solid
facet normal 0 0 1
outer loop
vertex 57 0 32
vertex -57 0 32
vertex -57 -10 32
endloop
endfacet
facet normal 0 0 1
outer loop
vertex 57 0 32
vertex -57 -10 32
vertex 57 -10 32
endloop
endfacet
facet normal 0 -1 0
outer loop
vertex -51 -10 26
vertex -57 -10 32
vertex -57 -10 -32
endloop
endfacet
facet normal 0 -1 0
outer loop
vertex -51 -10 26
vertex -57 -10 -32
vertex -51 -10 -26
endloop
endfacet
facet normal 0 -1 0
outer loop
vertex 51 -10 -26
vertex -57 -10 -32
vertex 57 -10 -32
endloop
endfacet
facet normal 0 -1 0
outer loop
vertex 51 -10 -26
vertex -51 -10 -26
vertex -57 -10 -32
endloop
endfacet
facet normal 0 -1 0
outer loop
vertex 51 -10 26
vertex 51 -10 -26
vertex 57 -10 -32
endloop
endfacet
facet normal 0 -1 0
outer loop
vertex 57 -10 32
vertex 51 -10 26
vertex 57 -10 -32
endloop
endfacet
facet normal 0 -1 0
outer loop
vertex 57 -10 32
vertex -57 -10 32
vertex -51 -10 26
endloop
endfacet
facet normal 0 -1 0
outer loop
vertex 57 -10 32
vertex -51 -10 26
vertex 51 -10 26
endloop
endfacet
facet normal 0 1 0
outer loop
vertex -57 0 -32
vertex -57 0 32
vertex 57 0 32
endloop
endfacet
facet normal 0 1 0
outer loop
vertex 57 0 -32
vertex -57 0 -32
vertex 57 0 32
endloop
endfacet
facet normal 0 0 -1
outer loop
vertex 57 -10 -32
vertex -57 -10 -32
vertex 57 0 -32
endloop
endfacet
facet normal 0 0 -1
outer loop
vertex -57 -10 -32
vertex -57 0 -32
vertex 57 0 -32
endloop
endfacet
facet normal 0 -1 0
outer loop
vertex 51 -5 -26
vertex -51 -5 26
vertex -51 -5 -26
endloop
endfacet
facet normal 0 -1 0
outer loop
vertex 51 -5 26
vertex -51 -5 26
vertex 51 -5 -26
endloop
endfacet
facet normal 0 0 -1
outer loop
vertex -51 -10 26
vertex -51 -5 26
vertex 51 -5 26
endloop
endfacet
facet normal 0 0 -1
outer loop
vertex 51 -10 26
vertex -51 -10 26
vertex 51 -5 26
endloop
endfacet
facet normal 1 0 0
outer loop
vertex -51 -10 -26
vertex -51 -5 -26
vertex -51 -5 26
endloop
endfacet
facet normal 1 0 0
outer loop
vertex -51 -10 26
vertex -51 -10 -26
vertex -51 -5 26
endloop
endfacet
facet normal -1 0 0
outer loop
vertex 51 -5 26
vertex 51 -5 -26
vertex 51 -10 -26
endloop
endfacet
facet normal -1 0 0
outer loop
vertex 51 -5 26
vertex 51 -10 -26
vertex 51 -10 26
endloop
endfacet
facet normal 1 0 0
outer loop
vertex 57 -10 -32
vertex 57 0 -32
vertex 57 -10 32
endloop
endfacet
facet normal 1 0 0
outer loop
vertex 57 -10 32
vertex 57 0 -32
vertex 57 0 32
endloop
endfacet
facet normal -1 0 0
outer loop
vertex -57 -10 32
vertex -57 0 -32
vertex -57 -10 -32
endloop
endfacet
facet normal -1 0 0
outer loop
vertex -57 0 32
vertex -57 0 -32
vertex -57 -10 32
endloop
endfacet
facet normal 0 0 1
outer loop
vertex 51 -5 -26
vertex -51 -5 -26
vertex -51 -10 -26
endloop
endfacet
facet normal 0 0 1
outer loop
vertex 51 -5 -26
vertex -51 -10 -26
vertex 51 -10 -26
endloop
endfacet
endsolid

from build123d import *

# Parameters (mm, degrees)
F0_W     = 114
F0_H     = 64
F1_DEPTH = 5
F2_W     = 114
F2_H     = 64
F2_W_2   = 102
F2_H_2   = 52
F3_DEPTH = 5


with BuildPart() as f1:
    # F0 (on Front) → F1 (new body)
    with BuildSketch(Plane.XZ):
        Rectangle(F0_W, F0_H)
    extrude(amount=F1_DEPTH)

    # F2 (on face) → F3 (join)
    with BuildSketch(Plane.XZ.offset(5)):
        Rectangle(F2_W, F2_H)
        Rectangle(F2_W_2, F2_H_2, mode=Mode.SUBTRACT)
    extrude(amount=F3_DEPTH)


solid = f1.part
